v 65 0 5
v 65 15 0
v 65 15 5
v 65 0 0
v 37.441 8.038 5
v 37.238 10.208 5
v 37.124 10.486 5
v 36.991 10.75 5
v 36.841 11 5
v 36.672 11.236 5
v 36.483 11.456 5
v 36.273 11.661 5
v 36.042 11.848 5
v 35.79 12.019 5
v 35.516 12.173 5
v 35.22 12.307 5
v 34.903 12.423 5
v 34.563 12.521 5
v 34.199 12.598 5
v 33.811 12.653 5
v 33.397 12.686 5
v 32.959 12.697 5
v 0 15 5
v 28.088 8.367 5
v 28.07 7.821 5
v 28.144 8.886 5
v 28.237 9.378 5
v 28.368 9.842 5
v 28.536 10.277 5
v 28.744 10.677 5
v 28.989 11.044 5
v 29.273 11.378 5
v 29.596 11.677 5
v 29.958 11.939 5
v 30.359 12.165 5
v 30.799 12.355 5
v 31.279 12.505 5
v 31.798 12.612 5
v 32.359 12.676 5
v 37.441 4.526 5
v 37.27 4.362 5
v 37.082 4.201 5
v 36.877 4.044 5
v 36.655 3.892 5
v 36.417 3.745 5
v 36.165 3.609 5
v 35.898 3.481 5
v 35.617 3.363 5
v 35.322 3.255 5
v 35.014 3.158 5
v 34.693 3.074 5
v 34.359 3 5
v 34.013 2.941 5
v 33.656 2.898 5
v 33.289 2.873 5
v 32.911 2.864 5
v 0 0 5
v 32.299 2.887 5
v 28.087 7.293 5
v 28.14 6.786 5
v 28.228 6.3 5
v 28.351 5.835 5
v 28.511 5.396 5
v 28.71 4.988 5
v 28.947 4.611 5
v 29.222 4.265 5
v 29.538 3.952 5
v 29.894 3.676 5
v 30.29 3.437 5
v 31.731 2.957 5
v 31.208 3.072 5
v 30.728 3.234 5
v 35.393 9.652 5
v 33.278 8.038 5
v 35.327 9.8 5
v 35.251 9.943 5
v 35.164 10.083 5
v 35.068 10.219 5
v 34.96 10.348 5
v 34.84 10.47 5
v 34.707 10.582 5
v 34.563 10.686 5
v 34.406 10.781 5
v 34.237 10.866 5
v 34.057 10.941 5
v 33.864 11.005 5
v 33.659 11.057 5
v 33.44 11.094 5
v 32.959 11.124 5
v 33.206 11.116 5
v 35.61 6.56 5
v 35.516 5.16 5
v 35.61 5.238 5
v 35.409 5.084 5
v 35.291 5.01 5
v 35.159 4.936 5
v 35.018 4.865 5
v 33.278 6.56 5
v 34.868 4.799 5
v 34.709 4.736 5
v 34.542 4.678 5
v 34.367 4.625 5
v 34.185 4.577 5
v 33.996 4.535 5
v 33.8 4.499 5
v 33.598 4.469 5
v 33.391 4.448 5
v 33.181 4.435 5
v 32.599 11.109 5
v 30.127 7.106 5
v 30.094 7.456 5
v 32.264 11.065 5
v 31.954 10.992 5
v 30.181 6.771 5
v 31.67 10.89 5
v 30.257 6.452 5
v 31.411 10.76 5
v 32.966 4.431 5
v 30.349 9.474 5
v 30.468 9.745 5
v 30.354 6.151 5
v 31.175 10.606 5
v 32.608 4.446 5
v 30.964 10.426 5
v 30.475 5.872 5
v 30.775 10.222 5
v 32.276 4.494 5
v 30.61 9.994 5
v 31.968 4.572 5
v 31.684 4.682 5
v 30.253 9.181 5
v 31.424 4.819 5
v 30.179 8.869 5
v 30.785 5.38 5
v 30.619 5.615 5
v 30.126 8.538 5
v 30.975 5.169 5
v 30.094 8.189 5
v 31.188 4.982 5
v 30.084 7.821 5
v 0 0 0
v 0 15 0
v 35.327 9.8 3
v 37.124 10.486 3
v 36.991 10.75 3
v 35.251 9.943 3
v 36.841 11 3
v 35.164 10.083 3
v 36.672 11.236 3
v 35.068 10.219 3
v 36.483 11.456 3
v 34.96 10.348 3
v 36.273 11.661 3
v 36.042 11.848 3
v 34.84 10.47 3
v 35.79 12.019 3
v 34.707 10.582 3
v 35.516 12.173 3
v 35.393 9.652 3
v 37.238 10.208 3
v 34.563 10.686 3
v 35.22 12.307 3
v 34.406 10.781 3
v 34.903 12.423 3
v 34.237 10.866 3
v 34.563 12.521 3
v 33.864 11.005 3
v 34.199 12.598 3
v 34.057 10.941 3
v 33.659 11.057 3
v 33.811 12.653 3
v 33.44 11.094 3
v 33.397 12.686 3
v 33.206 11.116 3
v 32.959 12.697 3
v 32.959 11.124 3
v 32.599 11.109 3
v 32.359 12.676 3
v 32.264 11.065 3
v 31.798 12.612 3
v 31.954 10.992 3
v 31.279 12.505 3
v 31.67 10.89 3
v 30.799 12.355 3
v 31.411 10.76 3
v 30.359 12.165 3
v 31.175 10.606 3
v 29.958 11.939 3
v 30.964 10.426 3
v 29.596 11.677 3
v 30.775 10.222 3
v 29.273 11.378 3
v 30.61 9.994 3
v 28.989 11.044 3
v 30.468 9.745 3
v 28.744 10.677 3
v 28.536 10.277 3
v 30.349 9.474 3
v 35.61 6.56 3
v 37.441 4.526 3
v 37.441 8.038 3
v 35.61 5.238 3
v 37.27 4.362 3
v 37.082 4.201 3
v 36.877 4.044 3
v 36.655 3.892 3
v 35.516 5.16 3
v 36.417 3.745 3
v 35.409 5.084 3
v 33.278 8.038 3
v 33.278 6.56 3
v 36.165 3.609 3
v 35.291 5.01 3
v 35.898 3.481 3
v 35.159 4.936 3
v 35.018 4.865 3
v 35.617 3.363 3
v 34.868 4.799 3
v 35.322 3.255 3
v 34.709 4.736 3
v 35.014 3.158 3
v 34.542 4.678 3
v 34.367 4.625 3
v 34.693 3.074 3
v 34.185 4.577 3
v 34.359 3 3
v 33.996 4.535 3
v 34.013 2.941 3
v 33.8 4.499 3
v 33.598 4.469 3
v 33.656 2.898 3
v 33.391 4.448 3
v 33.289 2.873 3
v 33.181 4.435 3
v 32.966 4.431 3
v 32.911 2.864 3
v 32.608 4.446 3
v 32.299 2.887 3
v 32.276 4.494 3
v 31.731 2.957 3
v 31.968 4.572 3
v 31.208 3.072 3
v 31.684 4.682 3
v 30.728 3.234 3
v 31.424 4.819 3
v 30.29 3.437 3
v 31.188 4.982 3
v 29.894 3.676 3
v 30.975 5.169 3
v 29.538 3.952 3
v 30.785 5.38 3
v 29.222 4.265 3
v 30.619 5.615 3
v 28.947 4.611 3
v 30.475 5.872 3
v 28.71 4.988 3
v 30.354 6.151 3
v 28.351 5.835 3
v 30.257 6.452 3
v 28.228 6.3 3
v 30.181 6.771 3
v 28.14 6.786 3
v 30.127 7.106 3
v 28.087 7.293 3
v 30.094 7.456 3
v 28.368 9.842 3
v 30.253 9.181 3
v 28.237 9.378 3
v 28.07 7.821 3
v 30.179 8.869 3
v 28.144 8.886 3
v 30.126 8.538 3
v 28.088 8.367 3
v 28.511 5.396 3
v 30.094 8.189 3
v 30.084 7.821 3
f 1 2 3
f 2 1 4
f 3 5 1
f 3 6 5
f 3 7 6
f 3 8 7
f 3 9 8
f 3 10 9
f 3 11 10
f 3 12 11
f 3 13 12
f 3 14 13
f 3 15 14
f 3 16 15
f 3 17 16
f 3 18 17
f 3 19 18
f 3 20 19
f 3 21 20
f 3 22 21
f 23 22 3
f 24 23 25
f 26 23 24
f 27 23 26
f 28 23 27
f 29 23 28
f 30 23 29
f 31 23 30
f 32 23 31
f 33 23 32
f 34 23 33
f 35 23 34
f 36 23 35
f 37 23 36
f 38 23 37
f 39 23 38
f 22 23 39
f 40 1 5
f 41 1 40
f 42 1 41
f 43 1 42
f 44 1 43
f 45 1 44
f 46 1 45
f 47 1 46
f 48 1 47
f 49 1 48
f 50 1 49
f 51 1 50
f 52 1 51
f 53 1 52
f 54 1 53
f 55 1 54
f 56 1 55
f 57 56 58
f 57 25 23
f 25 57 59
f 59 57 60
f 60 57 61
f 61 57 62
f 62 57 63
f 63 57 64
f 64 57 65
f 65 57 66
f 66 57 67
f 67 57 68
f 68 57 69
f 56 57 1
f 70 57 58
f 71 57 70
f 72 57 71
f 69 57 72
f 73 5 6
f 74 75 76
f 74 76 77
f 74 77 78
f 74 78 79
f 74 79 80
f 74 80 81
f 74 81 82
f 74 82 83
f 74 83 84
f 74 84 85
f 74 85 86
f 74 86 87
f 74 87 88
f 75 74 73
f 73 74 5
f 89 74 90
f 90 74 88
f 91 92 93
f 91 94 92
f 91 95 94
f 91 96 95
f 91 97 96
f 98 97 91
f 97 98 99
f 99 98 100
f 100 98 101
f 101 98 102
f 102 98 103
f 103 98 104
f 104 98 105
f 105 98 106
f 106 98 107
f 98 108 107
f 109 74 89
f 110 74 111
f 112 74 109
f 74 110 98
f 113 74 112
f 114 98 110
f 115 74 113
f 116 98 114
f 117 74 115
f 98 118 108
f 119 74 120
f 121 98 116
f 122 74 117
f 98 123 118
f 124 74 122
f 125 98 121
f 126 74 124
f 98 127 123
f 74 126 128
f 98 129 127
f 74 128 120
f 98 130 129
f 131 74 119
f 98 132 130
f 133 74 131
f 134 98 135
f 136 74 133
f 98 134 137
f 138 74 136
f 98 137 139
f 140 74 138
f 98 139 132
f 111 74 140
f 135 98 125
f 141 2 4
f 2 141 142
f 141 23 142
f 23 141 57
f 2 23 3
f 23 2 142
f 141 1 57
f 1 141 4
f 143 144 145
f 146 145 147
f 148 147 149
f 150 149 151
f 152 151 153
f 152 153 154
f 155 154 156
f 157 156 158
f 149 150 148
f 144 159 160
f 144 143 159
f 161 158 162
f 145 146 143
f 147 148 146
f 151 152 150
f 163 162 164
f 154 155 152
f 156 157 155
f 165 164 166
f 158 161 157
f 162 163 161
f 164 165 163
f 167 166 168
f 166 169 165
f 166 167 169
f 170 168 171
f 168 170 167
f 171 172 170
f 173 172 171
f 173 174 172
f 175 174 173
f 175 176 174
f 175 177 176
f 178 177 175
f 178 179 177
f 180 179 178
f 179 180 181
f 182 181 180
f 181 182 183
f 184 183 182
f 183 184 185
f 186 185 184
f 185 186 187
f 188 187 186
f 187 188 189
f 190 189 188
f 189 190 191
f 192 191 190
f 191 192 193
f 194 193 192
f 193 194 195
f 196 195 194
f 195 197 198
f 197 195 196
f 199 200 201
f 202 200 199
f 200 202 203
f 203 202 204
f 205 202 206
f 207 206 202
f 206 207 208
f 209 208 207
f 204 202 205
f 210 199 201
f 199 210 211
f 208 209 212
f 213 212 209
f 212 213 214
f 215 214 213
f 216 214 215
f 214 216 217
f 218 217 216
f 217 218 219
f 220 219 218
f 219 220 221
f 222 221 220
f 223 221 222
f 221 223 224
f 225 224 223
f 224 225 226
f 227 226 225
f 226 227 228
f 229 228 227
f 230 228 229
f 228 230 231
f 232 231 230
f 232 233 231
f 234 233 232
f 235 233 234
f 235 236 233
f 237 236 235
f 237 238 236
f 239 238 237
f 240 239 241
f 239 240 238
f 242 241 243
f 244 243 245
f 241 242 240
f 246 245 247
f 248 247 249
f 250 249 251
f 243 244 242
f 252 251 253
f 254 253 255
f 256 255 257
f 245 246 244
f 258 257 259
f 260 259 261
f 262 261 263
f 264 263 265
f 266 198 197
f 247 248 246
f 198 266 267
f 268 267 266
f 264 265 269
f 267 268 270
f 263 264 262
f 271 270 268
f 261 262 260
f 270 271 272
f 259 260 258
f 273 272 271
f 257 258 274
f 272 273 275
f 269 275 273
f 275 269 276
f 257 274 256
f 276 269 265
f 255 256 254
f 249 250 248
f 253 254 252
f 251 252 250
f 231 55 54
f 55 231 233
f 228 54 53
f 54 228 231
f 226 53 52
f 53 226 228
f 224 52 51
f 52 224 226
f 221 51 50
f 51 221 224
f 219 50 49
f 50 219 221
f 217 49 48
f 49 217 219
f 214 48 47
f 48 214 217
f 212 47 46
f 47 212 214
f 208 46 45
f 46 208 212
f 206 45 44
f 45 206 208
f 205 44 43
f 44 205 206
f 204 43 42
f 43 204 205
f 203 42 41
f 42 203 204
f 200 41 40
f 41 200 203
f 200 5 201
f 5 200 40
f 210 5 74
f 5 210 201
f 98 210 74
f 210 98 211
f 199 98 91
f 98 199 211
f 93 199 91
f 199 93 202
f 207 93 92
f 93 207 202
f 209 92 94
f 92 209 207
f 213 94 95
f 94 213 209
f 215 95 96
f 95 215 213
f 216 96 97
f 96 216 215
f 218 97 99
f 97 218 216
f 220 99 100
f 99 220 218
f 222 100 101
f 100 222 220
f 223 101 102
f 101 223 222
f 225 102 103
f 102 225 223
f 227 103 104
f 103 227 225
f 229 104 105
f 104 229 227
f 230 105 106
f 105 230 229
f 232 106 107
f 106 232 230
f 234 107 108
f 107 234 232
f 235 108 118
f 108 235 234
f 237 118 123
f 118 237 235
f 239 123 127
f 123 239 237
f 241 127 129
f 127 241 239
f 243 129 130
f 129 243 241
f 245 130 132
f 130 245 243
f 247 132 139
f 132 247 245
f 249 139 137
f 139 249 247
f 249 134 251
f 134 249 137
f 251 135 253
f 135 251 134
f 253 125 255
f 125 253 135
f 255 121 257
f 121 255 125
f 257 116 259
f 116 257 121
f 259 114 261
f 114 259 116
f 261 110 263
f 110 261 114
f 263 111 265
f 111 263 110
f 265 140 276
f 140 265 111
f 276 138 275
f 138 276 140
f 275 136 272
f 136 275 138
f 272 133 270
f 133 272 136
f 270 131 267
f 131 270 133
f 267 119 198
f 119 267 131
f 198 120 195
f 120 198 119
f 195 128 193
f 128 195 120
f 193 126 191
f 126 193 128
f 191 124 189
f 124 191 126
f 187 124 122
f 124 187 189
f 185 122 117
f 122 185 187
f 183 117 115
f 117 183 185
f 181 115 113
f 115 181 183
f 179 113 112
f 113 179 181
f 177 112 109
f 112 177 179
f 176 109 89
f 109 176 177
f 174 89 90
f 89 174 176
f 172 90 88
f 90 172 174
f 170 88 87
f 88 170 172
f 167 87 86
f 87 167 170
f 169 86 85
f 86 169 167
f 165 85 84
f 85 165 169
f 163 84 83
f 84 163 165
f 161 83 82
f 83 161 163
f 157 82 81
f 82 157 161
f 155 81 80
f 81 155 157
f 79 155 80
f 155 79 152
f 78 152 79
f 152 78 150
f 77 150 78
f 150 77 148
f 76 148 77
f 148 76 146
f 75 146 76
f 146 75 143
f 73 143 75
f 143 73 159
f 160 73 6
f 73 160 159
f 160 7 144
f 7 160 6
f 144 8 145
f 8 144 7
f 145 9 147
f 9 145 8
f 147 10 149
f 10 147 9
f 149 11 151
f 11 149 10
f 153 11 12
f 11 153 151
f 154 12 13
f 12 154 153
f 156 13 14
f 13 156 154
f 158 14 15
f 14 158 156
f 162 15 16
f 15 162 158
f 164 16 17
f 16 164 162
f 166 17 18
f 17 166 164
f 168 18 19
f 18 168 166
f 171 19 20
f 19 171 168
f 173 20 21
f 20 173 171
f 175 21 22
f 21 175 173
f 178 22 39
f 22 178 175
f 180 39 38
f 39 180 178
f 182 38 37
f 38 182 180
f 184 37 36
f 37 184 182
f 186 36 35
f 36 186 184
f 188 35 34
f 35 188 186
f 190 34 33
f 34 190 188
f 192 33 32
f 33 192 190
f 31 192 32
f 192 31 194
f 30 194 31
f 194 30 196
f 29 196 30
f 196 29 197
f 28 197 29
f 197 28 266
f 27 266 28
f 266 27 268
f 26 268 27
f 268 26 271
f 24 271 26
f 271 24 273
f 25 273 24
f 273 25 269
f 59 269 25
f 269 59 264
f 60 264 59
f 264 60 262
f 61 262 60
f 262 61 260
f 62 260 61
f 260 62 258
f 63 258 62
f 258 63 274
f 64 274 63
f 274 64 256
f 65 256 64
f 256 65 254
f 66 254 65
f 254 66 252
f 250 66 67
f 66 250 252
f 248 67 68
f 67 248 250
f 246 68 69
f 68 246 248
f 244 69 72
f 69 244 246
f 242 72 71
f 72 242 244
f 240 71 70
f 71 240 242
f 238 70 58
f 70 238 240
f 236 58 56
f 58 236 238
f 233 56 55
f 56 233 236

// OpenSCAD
difference(){
	union(){ 
        translate([0,0,0]){
           cube([65,15,5], center=false);
        }                
	}
	union() {
        translate([60-65/2, 3,3]){
            linear_extrude(height = 10) {
                text("G", size = 10, font="Arial:style=Bold");
            }
        }                


	}
}
